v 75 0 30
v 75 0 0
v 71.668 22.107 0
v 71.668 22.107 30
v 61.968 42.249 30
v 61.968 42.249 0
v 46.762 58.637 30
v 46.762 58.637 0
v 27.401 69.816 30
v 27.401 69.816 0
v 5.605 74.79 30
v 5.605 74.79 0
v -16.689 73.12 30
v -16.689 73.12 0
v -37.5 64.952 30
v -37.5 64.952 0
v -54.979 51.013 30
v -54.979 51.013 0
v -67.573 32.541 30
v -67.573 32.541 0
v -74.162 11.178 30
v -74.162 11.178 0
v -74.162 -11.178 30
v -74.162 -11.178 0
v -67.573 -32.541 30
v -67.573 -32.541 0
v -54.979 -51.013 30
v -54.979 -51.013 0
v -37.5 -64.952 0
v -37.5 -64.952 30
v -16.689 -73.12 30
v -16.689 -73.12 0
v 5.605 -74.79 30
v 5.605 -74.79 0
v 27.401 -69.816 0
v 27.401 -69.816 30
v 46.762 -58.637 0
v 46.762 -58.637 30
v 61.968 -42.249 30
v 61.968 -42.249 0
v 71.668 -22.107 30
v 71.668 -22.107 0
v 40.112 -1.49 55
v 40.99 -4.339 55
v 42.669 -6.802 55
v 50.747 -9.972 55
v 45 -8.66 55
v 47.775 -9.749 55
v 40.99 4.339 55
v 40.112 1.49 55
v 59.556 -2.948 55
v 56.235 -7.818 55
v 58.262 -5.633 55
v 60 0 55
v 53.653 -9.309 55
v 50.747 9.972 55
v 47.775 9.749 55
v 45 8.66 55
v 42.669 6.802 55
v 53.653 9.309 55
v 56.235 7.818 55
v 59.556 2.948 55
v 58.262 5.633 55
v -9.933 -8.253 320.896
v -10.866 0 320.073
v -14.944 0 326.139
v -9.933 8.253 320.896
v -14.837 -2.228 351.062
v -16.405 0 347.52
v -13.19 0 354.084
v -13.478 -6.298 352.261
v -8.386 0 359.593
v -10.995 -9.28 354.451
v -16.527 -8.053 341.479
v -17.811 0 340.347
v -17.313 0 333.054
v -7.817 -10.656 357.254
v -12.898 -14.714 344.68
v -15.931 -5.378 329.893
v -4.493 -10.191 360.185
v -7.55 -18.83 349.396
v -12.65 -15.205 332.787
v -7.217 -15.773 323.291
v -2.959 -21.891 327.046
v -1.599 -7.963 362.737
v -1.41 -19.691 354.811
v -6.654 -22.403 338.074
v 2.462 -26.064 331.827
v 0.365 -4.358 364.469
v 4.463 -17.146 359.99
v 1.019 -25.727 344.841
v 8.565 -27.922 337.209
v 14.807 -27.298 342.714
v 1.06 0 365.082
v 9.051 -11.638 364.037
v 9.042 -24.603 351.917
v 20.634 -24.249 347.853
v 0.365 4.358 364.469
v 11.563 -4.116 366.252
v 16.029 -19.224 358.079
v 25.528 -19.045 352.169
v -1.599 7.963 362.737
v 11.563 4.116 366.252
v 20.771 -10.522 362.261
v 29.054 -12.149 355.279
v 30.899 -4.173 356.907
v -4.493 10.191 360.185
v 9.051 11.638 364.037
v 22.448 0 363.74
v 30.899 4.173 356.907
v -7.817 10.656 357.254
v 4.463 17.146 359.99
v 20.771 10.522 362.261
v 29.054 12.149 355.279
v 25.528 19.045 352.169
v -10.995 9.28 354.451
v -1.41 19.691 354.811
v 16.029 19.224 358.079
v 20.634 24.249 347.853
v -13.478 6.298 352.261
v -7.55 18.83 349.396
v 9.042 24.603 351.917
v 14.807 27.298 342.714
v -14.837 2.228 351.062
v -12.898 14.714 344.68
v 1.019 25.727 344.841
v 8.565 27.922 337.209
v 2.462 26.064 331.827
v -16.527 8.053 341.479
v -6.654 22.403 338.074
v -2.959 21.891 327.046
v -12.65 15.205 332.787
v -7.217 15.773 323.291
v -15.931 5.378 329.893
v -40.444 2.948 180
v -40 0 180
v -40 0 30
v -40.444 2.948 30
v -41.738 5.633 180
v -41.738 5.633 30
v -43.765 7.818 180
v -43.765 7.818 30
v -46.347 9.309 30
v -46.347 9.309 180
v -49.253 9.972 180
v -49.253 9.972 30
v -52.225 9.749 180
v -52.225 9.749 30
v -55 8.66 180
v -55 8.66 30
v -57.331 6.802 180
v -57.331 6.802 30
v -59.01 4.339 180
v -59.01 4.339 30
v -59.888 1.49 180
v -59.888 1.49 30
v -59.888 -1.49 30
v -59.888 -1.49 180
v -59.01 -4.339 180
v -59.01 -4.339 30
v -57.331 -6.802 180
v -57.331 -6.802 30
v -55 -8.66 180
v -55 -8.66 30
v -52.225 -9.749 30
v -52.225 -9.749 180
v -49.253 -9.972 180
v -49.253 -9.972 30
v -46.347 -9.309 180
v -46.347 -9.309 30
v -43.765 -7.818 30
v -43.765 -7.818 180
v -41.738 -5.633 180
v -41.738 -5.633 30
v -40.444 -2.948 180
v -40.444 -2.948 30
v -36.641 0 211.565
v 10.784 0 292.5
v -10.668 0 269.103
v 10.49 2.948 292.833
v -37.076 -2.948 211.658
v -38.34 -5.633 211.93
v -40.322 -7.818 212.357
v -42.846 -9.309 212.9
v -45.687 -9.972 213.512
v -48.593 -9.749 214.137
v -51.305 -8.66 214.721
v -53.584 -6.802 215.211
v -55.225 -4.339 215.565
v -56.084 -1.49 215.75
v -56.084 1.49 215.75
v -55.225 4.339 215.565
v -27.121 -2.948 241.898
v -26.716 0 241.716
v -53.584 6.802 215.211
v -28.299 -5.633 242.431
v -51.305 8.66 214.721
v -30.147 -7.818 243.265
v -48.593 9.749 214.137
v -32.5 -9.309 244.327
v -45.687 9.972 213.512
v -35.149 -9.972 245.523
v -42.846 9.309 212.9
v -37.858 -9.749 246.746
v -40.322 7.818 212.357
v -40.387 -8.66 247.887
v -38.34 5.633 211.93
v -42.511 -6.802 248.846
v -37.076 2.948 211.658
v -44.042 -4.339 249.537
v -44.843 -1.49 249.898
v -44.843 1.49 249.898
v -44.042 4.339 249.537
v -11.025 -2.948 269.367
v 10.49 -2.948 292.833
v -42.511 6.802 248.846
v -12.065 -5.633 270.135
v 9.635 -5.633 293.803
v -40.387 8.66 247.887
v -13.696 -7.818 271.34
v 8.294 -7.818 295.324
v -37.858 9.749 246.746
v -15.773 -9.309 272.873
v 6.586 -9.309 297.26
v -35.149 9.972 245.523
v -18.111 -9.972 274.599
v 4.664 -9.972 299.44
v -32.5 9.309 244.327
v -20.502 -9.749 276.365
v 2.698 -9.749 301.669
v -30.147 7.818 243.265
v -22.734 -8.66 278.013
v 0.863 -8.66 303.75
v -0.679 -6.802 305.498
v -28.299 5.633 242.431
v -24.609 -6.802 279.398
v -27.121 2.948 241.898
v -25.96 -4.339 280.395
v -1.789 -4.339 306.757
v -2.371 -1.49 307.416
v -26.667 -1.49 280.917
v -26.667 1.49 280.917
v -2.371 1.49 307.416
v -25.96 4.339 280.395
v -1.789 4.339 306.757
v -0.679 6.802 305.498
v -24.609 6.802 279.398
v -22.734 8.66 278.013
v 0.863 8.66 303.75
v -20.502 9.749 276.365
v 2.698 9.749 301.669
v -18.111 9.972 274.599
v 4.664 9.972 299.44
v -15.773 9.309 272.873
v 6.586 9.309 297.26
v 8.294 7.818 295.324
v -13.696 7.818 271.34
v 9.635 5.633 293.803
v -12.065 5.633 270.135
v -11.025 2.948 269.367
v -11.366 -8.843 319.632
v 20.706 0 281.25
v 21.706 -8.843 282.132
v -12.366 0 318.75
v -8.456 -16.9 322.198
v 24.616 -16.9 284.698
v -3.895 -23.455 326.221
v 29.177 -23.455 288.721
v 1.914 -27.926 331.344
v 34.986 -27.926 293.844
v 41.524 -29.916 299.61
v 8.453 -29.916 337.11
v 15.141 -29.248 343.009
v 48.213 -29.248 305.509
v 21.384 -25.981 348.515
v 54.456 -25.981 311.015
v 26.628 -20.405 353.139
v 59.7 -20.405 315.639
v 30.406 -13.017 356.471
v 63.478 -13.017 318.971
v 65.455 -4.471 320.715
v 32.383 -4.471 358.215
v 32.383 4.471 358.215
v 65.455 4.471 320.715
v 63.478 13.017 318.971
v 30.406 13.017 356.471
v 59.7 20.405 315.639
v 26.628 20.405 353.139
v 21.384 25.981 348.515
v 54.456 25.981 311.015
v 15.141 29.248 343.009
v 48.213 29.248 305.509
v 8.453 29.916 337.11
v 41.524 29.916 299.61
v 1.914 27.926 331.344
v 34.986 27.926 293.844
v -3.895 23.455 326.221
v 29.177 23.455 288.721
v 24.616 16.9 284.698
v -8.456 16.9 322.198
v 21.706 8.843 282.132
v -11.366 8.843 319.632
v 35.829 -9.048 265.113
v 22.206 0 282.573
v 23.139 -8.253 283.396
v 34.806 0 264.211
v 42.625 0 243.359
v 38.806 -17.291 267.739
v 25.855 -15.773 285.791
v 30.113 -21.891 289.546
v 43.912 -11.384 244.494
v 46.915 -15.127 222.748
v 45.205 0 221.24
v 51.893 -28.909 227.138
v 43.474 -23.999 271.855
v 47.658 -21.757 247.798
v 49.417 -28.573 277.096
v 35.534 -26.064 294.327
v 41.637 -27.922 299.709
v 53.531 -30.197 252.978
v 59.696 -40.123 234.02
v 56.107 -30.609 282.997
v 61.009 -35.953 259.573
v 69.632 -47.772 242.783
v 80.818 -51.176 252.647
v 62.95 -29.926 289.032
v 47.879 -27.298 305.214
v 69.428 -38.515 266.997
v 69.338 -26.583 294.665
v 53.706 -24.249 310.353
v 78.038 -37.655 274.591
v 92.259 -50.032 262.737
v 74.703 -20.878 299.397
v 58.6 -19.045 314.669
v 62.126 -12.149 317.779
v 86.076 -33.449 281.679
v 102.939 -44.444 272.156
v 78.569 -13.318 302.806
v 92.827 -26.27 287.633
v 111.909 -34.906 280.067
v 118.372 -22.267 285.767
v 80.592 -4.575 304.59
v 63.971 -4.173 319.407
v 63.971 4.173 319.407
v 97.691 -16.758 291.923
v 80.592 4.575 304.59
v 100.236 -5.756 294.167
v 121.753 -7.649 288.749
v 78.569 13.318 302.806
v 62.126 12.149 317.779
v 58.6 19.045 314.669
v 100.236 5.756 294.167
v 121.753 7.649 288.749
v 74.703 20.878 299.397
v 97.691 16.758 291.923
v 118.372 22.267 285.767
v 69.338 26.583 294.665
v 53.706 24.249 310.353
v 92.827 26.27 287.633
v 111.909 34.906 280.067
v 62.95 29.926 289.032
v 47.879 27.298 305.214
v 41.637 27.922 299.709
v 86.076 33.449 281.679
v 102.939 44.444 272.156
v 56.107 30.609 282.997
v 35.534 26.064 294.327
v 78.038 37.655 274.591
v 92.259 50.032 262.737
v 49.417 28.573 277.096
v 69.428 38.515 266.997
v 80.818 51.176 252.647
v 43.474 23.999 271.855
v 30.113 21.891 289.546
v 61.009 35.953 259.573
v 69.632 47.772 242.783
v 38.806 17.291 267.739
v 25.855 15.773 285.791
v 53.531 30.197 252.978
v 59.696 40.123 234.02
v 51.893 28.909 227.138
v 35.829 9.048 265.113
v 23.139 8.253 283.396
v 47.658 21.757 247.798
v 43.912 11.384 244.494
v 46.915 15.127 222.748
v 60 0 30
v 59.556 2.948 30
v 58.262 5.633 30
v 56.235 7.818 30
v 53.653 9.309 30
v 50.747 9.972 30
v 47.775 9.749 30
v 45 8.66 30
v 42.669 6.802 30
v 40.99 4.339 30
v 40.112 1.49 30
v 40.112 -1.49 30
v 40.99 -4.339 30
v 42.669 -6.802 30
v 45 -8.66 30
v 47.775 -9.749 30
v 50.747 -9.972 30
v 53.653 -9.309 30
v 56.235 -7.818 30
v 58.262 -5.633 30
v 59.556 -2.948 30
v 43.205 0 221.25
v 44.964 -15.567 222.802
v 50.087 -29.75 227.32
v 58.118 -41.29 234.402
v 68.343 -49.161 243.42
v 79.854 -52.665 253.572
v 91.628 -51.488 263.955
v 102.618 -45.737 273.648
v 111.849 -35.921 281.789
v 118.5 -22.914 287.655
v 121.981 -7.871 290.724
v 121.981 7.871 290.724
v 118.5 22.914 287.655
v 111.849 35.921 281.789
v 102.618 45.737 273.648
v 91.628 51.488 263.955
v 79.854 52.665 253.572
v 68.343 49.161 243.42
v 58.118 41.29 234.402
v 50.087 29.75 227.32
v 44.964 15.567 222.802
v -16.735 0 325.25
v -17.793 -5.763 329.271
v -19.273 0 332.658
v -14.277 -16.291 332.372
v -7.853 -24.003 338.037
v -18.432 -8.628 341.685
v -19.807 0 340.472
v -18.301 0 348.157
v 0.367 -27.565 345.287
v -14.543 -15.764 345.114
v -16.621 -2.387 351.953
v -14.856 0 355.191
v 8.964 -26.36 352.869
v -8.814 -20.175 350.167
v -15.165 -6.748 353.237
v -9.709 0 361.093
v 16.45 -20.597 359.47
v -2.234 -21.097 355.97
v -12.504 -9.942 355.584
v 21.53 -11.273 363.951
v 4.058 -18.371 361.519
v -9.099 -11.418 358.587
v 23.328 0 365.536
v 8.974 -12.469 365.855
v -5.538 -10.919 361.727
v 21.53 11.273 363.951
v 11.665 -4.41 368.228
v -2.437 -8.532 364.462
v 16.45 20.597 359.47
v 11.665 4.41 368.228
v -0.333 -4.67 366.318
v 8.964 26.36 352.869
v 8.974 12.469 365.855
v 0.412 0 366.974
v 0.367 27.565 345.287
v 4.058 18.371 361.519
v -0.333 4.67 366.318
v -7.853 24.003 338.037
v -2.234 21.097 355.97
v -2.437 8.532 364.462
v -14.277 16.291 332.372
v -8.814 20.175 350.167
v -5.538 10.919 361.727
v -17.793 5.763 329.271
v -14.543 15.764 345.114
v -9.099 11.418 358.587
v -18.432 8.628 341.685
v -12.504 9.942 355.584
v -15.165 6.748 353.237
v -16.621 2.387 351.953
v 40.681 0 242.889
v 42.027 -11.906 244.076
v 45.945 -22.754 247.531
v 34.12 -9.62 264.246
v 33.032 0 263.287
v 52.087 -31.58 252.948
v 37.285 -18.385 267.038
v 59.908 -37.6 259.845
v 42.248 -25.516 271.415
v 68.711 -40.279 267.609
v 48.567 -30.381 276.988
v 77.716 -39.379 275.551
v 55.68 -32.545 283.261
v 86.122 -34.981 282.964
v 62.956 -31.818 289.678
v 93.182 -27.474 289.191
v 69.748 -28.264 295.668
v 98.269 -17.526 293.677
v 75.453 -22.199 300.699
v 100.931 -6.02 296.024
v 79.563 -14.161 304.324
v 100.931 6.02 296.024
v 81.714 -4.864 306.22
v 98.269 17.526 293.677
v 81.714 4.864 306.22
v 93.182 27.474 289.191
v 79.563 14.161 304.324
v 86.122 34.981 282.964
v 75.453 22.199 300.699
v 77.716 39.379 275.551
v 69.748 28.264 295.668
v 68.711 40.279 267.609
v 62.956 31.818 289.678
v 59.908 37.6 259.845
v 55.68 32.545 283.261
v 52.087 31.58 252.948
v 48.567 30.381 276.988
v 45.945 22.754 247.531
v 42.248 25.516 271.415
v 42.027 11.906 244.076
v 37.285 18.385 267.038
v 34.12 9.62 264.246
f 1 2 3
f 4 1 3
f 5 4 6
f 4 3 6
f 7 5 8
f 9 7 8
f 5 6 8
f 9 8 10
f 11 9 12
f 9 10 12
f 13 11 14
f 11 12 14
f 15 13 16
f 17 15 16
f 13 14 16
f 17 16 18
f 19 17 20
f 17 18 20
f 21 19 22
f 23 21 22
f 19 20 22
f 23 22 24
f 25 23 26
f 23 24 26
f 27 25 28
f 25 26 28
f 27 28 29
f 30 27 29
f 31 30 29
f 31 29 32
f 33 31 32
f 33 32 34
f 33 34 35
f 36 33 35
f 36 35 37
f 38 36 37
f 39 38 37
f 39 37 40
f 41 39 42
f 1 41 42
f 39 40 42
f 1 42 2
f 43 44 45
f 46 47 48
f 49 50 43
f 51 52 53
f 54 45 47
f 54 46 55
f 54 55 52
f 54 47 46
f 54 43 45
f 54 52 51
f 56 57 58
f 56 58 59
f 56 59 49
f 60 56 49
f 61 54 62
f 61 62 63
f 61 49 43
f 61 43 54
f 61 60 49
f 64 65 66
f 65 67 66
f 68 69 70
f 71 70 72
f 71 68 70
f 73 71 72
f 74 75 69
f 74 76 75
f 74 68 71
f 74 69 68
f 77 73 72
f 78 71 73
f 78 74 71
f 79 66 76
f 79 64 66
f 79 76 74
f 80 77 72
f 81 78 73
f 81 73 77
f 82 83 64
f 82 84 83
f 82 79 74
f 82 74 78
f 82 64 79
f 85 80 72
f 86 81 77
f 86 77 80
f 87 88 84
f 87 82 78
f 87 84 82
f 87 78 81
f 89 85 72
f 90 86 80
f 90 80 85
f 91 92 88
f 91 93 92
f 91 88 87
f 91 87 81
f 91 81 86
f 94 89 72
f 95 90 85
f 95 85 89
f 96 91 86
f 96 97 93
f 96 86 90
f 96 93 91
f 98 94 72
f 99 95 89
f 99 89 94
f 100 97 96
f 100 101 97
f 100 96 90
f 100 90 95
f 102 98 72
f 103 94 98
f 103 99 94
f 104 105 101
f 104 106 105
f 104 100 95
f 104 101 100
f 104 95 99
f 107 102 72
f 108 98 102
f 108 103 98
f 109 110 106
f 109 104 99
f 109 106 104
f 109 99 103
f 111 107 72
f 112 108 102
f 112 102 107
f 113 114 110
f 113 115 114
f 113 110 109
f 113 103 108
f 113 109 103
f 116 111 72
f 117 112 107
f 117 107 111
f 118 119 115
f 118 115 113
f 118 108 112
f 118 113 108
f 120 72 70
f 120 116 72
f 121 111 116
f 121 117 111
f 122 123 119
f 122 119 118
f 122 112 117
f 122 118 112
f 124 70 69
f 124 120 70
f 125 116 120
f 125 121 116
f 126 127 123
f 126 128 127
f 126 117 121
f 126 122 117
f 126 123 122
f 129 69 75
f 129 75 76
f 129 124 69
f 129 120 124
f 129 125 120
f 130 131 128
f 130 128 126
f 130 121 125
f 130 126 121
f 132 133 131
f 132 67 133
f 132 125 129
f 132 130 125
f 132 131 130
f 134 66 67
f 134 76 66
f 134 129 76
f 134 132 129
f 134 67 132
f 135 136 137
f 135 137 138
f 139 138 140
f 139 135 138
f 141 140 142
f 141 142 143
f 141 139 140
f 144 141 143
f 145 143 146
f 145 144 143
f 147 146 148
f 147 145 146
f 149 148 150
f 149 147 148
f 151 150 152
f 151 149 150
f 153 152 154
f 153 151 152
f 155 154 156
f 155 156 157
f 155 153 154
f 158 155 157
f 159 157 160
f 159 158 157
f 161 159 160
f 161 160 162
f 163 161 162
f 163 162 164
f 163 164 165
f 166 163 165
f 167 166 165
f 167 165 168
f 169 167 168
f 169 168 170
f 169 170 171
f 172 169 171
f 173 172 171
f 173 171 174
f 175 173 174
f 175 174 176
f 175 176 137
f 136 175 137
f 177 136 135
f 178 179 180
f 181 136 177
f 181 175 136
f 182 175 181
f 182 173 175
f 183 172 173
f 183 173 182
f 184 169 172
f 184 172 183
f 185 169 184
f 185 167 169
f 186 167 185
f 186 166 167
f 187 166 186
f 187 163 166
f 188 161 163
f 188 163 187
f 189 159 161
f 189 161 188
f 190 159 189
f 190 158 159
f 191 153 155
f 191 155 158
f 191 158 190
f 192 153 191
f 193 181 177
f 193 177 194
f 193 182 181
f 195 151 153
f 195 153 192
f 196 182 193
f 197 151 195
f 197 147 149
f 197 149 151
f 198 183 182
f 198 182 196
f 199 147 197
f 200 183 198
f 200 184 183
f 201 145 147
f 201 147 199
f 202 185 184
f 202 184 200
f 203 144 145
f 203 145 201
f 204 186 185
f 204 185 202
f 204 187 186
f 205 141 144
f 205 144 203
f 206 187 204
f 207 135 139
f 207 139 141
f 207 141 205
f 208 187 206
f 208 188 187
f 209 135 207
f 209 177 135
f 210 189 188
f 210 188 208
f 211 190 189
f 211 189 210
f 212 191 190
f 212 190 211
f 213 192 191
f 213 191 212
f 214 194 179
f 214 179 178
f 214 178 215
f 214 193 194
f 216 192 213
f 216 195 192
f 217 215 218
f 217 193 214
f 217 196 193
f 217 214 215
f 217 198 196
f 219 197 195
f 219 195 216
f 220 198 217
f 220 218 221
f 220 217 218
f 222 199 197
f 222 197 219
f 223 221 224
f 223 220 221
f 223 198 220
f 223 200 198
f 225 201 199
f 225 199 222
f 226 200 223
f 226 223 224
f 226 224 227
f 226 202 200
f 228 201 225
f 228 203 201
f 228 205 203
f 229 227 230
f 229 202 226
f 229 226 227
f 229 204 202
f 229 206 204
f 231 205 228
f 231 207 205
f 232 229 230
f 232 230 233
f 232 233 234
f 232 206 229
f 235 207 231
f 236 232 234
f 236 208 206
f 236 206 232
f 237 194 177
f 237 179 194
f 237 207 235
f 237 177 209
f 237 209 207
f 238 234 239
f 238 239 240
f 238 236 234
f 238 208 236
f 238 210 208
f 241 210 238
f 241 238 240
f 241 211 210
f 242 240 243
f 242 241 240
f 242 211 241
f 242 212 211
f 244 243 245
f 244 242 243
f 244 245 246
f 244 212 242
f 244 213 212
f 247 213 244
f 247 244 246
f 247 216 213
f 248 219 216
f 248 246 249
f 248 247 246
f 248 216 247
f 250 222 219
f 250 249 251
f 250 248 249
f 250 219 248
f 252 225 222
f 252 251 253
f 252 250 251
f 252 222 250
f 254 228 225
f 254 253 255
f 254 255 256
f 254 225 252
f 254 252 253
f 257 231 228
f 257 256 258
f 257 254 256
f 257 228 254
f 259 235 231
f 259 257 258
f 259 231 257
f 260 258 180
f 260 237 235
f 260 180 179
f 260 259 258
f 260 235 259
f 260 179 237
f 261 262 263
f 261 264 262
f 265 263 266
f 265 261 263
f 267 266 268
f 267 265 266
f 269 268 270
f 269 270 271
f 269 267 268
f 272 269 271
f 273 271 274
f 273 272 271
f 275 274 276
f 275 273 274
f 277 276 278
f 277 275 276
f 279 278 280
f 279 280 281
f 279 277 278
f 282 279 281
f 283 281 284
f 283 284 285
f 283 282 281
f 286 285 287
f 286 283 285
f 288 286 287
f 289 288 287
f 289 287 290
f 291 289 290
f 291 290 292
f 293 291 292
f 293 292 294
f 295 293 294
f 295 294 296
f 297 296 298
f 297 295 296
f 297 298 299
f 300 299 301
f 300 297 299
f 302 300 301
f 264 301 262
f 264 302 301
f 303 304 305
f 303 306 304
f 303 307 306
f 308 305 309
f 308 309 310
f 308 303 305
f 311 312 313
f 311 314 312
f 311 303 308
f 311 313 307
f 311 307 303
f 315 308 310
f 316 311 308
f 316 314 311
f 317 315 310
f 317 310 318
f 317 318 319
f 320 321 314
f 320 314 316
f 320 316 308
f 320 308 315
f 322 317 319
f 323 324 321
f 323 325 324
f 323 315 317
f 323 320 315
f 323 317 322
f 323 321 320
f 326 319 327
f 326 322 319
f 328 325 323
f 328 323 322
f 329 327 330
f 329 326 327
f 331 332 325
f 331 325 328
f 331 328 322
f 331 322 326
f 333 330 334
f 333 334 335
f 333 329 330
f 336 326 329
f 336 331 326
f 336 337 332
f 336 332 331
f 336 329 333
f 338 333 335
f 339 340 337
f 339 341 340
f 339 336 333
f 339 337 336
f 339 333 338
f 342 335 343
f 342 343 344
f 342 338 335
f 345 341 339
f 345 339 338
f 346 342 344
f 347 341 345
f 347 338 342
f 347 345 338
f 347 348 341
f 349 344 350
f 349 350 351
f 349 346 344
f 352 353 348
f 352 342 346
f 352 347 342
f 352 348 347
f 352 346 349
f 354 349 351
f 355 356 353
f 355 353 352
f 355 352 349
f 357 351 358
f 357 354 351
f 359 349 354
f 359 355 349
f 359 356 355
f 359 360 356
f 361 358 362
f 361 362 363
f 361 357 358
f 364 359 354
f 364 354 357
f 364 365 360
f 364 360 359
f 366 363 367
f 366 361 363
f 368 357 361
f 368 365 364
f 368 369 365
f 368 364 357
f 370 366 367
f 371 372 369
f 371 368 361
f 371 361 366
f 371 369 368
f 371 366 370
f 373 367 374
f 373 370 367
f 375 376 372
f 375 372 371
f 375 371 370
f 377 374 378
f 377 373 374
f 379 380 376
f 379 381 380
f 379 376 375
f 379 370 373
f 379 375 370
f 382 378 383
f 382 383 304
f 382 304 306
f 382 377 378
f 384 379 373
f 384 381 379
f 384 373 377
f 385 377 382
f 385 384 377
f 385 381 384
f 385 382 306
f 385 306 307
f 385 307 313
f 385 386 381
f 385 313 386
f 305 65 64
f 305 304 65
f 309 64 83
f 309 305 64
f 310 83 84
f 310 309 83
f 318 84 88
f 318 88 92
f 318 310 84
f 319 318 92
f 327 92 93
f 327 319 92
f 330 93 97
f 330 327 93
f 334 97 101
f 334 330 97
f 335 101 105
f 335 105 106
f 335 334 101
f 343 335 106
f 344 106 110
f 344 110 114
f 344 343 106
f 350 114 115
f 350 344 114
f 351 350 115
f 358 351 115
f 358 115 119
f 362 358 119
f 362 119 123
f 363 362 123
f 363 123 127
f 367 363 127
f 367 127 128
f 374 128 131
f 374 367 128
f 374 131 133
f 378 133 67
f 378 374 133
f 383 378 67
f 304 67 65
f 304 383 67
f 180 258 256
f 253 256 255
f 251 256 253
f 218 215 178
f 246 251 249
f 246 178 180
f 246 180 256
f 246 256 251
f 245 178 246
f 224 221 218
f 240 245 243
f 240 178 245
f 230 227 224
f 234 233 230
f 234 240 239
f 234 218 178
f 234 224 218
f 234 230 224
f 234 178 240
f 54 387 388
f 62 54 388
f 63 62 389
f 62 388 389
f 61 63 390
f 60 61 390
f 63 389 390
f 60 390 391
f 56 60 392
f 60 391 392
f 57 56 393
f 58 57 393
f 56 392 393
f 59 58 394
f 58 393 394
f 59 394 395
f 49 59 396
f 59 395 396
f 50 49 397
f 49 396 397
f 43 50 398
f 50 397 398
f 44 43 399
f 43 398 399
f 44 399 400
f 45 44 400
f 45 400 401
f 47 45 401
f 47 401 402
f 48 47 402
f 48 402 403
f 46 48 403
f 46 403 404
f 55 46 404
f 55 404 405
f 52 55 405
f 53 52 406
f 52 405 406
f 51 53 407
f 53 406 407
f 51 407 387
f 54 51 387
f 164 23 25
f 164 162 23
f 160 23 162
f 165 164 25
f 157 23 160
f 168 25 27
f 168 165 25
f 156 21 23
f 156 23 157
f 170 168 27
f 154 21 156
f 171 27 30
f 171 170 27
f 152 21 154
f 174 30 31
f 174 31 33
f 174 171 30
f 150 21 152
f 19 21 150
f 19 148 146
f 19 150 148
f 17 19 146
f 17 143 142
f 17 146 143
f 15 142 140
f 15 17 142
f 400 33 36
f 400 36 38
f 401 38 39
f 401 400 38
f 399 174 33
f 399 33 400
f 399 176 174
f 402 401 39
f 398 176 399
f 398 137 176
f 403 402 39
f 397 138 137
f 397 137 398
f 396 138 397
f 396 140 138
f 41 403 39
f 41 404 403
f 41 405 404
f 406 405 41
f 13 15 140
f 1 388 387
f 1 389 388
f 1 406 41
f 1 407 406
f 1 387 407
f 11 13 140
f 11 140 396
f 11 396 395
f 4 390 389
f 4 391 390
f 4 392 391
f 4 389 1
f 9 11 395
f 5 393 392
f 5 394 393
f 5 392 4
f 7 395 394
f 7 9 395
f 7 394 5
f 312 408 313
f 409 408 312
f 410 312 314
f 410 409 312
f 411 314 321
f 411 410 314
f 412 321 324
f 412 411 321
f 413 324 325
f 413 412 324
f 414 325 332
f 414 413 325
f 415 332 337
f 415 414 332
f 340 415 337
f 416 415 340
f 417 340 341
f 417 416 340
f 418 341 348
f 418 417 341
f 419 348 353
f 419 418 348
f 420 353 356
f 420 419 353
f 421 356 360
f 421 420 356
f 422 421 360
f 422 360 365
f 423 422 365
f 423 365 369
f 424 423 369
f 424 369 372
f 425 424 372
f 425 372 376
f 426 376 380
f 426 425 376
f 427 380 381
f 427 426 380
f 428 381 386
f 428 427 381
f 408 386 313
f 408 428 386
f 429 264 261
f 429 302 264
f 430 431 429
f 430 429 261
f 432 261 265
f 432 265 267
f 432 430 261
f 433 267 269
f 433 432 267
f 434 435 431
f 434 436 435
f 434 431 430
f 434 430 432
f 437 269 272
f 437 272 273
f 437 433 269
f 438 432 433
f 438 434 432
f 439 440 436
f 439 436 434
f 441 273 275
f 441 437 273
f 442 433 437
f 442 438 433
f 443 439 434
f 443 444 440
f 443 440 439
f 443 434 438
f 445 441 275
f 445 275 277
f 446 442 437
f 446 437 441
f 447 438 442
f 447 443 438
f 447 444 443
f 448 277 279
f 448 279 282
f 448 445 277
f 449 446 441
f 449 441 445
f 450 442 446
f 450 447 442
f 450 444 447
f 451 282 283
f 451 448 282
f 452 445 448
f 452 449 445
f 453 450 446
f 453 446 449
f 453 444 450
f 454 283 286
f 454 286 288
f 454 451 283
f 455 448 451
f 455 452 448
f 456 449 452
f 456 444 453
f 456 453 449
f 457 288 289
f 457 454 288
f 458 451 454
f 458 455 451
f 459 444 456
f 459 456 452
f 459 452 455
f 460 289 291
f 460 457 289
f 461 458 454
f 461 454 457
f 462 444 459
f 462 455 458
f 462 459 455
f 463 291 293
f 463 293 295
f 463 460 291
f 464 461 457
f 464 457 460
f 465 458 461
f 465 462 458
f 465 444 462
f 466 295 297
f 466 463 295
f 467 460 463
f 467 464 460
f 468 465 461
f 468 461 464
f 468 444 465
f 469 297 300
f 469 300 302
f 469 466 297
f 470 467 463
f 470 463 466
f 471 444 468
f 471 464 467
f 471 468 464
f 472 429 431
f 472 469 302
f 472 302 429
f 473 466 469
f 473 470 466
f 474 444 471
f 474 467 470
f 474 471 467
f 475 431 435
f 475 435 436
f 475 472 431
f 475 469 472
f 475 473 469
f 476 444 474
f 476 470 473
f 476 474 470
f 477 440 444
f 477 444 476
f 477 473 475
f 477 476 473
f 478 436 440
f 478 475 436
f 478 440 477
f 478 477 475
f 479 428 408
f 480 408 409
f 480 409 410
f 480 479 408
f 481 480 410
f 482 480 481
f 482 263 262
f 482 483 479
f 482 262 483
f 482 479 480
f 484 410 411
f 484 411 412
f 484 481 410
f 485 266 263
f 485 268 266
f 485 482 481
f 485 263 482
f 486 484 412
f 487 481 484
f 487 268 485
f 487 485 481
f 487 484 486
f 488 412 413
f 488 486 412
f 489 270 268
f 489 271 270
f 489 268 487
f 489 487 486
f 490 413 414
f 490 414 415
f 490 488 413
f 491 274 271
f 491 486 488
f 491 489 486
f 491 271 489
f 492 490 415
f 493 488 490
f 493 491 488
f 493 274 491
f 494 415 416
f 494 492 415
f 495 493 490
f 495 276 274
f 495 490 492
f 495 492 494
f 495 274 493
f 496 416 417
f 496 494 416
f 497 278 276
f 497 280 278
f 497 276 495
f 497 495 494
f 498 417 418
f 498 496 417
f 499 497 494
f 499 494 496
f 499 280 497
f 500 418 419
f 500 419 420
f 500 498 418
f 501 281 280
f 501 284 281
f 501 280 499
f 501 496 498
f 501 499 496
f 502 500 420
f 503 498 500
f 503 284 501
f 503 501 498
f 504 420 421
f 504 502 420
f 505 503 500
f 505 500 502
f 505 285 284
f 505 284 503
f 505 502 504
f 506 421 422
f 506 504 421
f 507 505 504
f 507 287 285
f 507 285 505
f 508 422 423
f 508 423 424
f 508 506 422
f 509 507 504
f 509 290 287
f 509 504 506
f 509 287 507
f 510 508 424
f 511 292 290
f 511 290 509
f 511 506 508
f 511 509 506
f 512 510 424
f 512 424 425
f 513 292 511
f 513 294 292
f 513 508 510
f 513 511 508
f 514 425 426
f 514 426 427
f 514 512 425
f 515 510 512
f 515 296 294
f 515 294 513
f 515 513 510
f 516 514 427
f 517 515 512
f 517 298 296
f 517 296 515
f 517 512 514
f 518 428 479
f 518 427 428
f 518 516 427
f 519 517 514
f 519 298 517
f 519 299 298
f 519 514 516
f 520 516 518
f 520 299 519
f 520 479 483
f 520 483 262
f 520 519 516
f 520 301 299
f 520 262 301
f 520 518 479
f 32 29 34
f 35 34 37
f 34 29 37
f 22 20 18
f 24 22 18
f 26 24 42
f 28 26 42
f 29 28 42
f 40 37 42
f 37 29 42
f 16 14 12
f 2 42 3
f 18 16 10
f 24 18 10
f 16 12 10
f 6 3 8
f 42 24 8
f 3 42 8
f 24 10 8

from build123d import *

# Parameters (mm, degrees)
SKETCH_1_R      = 75
EXTRUDE_1_DEPTH = 30
SKETCH_2_R      = 10
EXTRUDE_2_DEPTH = 25
SKETCH_3_R      = 10


with BuildPart() as part:
    # 草图1 → 凸台-拉伸1 (new body)
    with BuildSketch(Plane.XY):
        Circle(SKETCH_1_R)
    extrude(amount=EXTRUDE_1_DEPTH)

    # 草图2 → 凸台-拉伸2 (add)
    with BuildSketch(Plane.XY.offset(30)):
        with Locations((50, 0)):
            Circle(SKETCH_2_R)
    extrude(amount=EXTRUDE_2_DEPTH)

    # 扫描1: sweep along a path in 草图4
    with BuildLine(Plane(origin=(0, 0, 0), x_dir=(1, 0, 0), z_dir=(0, 1, 0))) as sweep_1_path:
        Line((-50, -30), (-50, -180))
        ThreePointArc((-50, -180), (-35.830052443, -245.830052443), (4.169947557, -300))
    # 草图3 → 扫描1 (sweep)
    with BuildSketch(Plane.XY.offset(30)):
        with Locations((-50, 0)):
            Circle(SKETCH_3_R)
    sweep(path=sweep_1_path.line)


with BuildPart() as body_2:
    # 草图5 → 旋转-薄壁7 (revolve)
    with BuildSketch(Plane(origin=(0, 0, 0), x_dir=(1, 0, 0), z_dir=(0, 1, 0))):
        with BuildLine():
            ThreePointArc((43.204662909, -221.25), (37.476087335, -253.320190263), (20.705893252, -281.25))
            Line((20.705893252, -281.25), (-12.365998137, -318.75))
            ThreePointArc((-12.365998137, -318.75), (-19.807115914, -340.471822209), (-9.70913297, -361.093134833))
            Line((-9.70913297, -361.093134833), (-8.386257314, -359.593134833))
            ThreePointArc((-8.386257314, -359.593134833), (-17.811041395, -340.346576384), (-10.865998137, -320.072875656))
            Line((-10.865998137, -320.072875656), (22.205893252, -282.572875656))
            ThreePointArc((22.205893252, -282.572875656), (39.348758315, -254.022403479), (45.204635568, -221.239542322))
            Line((45.204635568, -221.239542322), (43.204662909, -221.25))
        make_face()
    revolve(axis=Axis((158.834137133, 0, 169.983030042), (-0.6614378277661476, 0, 0.7500000000000001)))


solid = Compound([part.part, body_2.part])
